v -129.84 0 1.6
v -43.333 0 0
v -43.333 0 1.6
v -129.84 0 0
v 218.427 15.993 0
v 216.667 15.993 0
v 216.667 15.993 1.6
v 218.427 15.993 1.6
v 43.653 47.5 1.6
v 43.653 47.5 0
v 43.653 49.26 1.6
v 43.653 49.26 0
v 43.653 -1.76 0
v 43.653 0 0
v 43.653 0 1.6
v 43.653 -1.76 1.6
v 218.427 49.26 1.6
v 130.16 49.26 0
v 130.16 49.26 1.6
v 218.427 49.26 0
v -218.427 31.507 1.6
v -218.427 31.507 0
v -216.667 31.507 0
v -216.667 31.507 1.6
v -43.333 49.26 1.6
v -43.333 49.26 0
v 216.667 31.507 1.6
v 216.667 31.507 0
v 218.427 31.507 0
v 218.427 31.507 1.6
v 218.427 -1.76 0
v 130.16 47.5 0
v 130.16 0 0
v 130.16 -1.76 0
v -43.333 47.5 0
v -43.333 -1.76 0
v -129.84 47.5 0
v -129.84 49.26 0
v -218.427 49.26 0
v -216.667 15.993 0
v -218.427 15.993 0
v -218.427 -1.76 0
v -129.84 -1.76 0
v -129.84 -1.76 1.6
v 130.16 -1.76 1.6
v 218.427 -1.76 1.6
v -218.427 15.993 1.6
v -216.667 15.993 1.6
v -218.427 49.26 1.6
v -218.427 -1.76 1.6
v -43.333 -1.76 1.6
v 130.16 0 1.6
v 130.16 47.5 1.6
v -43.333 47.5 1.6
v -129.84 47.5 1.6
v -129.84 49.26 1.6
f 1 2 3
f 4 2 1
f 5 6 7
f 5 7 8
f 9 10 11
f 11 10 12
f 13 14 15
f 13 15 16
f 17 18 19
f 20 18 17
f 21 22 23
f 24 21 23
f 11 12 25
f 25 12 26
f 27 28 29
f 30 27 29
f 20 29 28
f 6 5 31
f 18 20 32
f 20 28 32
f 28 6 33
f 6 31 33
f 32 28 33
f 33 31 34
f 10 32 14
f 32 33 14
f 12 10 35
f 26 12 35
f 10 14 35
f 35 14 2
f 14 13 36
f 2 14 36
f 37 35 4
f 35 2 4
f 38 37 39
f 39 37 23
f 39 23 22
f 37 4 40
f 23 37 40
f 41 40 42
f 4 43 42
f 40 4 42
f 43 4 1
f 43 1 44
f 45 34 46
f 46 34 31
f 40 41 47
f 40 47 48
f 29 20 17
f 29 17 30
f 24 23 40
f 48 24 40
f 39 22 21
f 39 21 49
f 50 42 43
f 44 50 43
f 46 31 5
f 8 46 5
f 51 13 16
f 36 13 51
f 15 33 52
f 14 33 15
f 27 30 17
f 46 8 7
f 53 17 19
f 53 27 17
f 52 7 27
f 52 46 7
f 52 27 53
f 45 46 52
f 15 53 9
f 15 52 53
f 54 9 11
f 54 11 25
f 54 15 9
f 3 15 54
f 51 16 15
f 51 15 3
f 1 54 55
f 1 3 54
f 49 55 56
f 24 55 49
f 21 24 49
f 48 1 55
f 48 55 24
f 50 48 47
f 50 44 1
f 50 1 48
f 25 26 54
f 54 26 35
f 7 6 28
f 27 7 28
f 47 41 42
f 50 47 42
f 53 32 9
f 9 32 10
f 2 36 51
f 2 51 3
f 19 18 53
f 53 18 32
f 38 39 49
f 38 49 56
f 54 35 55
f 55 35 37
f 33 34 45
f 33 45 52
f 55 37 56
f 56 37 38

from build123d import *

# Parameters (mm, degrees)
BOSS_EXTRUDE1_DEPTH = 1.6


with BuildPart() as part:
    # Sketch1 → Boss-Extrude1 (new body)
    with BuildSketch(Plane.XY):
        Polygon((-43.3333329, 0), (-129.8399987, 0), (-129.8399987, -1.76), (-216.6666645, -1.76), (-218.4266645, -1.76), (-218.4266645, 0), (-218.4266645, 15.993333333), (-216.6666645, 15.993333333), (-216.6666645, 23.75), (216.6666645, 23.75), (216.6666645, 15.993333333), (218.4266645, 15.993333333), (218.4266645, 0), (218.4266645, -1.76), (216.6666645, -1.76), (130.1599987, -1.76), (130.1599987, 0), (43.6533329, 0), (43.6533329, -1.76), (-43.3333329, -1.76), align=None)
    boss_extrude1 = extrude(amount=BOSS_EXTRUDE1_DEPTH)

    # Mirror1: Boss-Extrude1 across plane
    add(boss_extrude1.mirror(Plane(origin=(216.6666645, 23.75, 1.6), x_dir=(0, 0, 1), z_dir=(0, -1, 0))))


solid = part.part
